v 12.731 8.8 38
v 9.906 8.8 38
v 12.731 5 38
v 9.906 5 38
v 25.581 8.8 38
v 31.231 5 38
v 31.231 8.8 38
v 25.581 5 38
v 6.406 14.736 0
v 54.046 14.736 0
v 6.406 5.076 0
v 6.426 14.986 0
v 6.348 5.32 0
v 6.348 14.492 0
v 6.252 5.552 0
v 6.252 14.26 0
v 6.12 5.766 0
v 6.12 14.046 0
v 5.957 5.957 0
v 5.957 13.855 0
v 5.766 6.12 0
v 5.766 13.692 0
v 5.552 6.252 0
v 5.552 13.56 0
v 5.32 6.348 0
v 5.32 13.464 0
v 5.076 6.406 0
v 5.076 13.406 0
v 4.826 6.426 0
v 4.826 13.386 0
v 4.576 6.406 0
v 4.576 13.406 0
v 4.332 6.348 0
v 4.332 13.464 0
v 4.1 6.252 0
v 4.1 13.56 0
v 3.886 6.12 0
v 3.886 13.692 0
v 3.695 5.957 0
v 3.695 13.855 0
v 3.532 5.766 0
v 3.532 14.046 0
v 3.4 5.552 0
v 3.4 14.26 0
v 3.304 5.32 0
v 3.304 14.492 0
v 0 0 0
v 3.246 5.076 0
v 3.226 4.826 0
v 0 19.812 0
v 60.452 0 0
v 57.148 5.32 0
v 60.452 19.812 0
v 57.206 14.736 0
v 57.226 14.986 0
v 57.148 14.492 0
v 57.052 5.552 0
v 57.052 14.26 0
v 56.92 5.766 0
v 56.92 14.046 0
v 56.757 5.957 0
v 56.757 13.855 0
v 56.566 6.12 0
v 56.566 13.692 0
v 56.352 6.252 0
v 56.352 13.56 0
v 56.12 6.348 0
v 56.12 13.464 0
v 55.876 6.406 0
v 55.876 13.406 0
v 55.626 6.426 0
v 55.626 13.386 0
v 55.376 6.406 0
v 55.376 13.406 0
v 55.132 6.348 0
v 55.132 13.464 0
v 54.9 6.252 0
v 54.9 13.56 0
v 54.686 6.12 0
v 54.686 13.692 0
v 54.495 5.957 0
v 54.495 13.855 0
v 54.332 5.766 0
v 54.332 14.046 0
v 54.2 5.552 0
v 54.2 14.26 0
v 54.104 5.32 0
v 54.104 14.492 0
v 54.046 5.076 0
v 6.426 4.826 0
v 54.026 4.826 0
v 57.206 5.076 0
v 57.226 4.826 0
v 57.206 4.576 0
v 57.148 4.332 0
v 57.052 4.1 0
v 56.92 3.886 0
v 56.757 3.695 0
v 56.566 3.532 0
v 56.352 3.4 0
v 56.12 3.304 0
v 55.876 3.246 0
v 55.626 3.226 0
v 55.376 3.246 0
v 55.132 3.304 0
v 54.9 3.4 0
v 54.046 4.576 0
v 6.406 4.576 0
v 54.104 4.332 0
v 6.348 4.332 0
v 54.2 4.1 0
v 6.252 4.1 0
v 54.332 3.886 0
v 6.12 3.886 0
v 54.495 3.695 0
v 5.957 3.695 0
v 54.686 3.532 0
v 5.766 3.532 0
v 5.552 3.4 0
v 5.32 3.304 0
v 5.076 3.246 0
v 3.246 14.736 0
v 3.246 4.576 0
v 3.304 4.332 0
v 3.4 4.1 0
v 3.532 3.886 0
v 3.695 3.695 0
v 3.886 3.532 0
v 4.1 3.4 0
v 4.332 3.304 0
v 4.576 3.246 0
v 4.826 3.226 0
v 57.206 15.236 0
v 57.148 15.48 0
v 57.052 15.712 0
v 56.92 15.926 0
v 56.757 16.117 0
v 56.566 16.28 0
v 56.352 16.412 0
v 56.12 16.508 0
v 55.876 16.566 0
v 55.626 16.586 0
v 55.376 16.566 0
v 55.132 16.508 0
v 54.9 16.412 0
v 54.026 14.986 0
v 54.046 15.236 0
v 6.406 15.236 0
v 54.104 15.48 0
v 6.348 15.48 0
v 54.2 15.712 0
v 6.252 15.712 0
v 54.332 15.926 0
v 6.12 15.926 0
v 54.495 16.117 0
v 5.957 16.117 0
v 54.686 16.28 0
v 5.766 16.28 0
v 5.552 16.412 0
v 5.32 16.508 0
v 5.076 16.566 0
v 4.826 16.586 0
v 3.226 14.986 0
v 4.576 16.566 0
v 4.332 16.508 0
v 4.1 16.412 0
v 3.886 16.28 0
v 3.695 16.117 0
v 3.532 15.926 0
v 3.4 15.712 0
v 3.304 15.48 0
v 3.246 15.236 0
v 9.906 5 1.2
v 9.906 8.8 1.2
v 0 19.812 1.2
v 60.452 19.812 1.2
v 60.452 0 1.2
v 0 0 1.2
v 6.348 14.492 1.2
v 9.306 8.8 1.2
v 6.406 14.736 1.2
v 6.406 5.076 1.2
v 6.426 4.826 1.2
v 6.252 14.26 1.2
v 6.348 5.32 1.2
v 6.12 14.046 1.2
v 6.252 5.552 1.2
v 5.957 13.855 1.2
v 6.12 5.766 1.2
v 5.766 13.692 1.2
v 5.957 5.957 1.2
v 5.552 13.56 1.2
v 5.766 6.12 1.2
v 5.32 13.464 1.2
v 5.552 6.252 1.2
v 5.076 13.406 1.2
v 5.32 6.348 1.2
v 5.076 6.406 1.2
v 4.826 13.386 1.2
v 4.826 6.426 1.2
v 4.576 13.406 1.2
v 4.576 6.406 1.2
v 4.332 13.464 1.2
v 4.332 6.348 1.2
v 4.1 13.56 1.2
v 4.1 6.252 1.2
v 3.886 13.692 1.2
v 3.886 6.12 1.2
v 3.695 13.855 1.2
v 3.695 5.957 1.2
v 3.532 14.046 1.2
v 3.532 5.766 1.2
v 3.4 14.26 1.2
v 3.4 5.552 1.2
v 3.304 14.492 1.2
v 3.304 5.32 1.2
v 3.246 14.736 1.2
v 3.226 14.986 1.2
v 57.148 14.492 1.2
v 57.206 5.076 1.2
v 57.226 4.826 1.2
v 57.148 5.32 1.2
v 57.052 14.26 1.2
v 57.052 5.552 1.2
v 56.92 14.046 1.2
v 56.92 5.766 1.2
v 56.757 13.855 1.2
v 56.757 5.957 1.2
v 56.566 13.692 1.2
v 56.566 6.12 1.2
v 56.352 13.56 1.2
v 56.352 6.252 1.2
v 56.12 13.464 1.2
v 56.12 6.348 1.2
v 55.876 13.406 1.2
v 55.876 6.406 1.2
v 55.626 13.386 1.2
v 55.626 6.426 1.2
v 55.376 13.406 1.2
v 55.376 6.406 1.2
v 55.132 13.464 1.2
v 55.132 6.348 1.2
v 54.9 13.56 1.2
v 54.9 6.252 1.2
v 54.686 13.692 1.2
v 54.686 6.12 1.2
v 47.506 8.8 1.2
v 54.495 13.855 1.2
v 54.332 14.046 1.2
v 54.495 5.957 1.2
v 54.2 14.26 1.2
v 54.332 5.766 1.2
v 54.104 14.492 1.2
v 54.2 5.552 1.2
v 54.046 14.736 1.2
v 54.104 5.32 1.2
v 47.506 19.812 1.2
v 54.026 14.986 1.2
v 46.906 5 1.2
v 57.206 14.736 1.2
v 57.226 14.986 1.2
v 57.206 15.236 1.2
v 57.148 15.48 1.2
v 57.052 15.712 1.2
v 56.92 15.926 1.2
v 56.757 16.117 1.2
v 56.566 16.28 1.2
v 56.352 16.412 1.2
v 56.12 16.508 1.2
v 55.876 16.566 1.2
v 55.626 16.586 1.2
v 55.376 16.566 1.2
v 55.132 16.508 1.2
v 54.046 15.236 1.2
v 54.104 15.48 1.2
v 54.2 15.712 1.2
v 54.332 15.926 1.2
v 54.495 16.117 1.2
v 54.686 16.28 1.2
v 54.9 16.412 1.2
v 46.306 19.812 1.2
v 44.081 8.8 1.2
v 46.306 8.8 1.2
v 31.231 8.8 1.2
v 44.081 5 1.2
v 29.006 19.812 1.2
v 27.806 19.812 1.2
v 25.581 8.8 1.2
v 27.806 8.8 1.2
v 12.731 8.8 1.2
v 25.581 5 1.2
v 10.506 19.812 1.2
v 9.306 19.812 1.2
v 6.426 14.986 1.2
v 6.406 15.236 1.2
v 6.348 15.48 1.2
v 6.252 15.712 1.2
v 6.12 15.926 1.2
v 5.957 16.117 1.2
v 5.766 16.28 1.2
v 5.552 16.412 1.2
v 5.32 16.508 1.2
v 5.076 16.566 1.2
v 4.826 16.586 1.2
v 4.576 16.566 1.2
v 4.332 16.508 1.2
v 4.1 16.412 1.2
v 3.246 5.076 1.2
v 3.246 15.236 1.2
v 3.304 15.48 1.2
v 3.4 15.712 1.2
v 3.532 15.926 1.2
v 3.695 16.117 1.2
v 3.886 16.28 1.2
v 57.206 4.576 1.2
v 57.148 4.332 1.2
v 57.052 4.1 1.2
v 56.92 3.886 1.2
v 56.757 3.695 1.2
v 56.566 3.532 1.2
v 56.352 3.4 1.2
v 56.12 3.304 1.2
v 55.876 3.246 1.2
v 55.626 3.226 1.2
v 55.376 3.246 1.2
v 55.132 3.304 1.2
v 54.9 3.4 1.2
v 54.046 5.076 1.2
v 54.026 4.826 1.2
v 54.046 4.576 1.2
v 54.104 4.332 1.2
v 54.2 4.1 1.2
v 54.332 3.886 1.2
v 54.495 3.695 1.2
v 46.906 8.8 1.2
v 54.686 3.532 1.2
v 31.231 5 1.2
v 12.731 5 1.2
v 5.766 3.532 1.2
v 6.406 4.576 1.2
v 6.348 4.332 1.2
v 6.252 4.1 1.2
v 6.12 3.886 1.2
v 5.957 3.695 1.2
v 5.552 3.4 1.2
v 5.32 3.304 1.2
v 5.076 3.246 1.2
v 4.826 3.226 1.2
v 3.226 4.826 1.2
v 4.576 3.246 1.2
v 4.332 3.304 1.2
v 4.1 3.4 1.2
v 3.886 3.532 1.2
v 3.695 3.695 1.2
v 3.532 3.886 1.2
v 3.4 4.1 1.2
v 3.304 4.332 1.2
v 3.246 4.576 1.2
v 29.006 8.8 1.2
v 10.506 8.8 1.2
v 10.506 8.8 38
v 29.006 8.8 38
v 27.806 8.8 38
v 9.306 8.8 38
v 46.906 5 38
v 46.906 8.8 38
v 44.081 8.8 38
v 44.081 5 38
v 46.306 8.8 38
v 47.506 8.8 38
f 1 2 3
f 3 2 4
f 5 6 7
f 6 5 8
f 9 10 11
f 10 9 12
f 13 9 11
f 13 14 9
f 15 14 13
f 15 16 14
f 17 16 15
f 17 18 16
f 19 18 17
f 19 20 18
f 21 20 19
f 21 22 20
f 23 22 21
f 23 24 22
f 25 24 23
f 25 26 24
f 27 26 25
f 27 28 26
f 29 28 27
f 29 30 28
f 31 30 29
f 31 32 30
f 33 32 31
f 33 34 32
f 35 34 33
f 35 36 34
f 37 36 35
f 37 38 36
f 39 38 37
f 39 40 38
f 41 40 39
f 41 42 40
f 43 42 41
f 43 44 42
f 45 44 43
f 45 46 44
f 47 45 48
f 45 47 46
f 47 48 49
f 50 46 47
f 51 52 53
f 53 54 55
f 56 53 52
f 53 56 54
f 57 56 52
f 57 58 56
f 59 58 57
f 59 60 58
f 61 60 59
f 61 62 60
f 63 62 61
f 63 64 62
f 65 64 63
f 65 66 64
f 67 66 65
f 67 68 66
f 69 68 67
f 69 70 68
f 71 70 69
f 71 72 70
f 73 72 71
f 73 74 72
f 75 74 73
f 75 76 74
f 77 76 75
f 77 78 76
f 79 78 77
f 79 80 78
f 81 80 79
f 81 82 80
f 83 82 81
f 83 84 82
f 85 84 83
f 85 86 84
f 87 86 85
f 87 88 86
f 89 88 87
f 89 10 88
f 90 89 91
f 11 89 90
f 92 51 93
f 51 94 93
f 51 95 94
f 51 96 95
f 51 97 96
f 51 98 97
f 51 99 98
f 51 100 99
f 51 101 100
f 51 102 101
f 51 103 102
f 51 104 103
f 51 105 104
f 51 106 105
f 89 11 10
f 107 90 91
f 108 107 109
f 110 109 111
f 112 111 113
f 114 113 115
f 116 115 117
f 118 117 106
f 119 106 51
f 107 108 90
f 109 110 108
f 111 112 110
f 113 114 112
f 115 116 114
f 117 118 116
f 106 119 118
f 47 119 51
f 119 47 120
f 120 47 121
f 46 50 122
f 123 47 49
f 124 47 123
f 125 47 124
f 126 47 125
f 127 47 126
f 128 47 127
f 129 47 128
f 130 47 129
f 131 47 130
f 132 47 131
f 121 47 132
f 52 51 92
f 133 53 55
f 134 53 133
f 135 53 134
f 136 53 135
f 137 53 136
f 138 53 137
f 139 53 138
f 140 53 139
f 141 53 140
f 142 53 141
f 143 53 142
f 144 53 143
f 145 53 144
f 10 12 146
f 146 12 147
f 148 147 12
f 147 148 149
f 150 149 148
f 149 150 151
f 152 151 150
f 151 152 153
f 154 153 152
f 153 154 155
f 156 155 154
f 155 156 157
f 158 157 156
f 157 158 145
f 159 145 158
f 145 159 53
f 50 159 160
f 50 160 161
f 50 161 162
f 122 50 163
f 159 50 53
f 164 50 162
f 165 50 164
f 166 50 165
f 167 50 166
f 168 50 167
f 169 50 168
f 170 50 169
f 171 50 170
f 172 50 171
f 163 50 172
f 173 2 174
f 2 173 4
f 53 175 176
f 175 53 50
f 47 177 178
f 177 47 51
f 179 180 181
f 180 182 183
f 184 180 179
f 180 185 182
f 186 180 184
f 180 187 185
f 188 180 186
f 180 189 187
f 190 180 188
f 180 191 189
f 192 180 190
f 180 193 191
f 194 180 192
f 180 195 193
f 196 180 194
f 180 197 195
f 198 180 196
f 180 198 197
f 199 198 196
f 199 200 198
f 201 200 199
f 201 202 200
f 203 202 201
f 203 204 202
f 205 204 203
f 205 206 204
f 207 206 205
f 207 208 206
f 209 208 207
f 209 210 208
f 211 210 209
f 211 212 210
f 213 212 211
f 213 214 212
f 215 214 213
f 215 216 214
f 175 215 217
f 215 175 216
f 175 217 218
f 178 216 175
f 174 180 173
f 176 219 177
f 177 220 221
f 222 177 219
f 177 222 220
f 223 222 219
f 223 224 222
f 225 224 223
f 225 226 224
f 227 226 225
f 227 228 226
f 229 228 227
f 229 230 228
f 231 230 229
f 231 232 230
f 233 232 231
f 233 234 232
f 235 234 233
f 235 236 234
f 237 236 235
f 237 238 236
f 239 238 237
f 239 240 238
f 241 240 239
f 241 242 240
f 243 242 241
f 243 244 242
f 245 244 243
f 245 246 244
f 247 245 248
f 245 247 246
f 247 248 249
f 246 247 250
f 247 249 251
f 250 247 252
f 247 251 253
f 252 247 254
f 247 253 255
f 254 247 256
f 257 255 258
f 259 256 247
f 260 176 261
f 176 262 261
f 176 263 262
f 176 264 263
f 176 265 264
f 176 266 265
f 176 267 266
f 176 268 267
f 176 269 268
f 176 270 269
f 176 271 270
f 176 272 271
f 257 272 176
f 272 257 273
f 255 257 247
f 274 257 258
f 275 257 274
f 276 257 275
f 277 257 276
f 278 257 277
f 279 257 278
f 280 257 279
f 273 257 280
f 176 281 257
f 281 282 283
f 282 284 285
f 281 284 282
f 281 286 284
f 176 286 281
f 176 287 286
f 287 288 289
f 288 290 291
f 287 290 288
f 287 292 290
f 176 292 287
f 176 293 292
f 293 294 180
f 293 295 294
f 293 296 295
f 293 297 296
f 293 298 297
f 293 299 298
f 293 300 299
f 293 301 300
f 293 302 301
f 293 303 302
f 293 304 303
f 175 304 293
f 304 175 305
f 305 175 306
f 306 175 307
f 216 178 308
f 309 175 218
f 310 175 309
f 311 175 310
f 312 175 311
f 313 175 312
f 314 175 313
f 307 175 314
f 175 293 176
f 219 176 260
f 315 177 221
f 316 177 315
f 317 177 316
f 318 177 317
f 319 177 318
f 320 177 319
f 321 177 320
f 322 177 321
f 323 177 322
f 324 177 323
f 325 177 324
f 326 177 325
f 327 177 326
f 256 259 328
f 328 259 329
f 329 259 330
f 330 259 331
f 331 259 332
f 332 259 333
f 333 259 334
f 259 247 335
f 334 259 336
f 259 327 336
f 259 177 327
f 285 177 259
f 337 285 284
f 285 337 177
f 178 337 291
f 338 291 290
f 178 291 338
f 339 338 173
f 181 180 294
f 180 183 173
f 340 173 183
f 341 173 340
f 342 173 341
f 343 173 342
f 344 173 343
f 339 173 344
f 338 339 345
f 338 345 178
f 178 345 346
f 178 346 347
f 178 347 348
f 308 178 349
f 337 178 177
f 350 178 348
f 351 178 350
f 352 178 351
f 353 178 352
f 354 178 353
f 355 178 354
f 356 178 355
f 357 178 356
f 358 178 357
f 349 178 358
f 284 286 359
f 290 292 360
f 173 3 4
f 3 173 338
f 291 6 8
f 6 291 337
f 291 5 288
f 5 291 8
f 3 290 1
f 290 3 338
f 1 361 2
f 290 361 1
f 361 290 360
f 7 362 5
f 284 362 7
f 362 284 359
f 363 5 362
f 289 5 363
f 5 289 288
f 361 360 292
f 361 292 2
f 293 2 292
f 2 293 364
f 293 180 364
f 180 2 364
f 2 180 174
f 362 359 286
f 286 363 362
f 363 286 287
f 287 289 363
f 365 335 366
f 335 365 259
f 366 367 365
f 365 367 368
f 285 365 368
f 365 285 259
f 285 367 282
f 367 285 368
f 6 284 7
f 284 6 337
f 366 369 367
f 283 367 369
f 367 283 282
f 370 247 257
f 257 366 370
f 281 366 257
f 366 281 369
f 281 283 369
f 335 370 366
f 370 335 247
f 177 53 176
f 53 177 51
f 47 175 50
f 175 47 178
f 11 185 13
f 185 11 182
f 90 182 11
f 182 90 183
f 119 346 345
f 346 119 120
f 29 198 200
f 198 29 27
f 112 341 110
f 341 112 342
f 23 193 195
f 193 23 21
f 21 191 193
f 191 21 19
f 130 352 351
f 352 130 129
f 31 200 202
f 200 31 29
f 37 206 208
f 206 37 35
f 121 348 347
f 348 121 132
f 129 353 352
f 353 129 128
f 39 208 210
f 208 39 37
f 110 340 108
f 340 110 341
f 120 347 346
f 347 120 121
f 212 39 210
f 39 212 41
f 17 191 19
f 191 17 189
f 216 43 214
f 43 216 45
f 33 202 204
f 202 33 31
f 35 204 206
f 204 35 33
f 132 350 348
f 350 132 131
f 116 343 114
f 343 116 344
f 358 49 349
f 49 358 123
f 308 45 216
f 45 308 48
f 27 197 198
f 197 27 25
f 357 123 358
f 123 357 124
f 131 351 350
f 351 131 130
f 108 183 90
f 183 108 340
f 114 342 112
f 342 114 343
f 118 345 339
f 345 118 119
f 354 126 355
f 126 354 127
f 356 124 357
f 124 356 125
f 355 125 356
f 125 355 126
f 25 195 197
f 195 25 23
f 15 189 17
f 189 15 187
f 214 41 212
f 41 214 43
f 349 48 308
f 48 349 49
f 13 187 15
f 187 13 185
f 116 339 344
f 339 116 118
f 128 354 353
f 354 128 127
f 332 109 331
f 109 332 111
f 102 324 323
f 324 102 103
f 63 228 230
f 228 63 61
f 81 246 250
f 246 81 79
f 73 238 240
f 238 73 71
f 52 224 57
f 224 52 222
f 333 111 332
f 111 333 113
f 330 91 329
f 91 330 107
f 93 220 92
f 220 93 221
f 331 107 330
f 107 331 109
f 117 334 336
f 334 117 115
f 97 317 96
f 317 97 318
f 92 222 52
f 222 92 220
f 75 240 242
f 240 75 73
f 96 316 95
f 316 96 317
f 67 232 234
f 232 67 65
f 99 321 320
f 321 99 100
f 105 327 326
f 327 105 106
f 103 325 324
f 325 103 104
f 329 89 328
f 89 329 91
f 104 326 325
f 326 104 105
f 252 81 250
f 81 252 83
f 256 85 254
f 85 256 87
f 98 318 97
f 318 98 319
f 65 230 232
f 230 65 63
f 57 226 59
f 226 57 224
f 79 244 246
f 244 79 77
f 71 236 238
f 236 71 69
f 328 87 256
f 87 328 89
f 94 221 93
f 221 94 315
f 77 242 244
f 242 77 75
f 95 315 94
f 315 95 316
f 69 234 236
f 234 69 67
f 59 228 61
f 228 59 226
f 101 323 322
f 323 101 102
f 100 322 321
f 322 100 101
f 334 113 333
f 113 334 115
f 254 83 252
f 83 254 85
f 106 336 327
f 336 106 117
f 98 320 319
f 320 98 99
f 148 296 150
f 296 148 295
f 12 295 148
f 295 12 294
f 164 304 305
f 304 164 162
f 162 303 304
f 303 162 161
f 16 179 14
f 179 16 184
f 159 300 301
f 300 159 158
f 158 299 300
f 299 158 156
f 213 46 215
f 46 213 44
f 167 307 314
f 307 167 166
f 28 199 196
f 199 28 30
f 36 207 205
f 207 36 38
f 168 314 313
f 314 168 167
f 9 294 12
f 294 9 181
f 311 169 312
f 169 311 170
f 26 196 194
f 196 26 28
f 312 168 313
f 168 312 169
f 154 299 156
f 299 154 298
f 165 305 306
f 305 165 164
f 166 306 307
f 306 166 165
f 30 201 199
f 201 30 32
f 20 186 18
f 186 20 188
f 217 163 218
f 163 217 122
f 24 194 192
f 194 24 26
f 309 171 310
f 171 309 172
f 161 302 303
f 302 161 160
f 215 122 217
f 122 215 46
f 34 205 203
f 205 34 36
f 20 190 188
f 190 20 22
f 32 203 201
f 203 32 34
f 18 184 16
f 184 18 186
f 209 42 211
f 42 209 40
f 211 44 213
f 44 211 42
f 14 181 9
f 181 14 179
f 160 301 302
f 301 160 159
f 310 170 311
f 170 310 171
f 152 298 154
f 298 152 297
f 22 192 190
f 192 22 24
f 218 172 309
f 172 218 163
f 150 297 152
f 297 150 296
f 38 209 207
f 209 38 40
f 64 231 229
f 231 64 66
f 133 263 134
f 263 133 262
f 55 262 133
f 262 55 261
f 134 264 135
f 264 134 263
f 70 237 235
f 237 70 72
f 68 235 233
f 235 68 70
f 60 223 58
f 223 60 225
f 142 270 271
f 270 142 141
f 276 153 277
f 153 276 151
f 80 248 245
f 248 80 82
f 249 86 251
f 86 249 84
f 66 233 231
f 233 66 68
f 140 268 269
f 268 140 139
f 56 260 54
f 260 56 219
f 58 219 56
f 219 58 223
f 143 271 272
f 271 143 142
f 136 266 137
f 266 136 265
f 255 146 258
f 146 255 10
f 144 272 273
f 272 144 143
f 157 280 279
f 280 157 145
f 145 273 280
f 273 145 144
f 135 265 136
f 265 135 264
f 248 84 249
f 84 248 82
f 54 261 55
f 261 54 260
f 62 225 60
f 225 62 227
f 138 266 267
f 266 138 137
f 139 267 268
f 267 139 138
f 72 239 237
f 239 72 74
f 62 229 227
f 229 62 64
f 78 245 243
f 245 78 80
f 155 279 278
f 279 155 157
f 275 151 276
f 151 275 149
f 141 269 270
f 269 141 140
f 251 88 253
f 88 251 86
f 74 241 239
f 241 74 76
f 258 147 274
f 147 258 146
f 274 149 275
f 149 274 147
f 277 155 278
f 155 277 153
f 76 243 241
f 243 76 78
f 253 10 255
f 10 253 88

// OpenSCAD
$fn=40; // model faces resolution.

RJ12_otvor_velikost_x=12.85;
RJ12_otvor_velikost_y=2*18.4;
RJ12_otvor_sila_materialu=3.8;
RJ12_vzdalenost_od_okraje=5;
RJ12_sire_konektoru=15;
RJ12_rozestup_mezi_konektory=3.5;
sila_materialu=1.2;
roztec_der=10.16;
pocet_der_v_ose_y=2;
pocet_der_v_ose_x=6;
snizeni_rozmeru_desky=0.254;
RJ_pocet_konektoru=2;

prumer_sroubu=3.2;

//konektor();
drzak();

module drzak(){

for(a = [0 : 1 : RJ_pocet_konektoru-1])
  {  
      translate([a*(RJ12_sire_konektoru+RJ12_rozestup_mezi_konektory)+roztec_der-snizeni_rozmeru_desky,0,0]) 
     konektor(); 
      
      
}

deska();
 }
 
 
module konektor(){
//bocní vyztuhy
    
   translate([sila_materialu/2,0,0])
    rotate ([0,-90,0])
            linear_extrude (height = sila_materialu, convexity = 10)
                polygon(points=[[sila_materialu,RJ12_vzdalenost_od_okraje+RJ12_otvor_sila_materialu],[RJ12_otvor_velikost_y+sila_materialu, RJ12_vzdalenost_od_okraje+RJ12_otvor_sila_materialu],[sila_materialu,roztec_der*pocet_der_v_ose_y-2*snizeni_rozmeru_desky],[sila_materialu,roztec_der*pocet_der_v_ose_y-2*snizeni_rozmeru_desky]]); 
   
     translate([RJ12_sire_konektoru+RJ12_rozestup_mezi_konektory+sila_materialu/2,0,0])
    rotate ([0,-90,0])
            linear_extrude (height = sila_materialu, convexity = 10)
                polygon(points=[[sila_materialu,RJ12_vzdalenost_od_okraje+RJ12_otvor_sila_materialu],[RJ12_otvor_velikost_y+sila_materialu, RJ12_vzdalenost_od_okraje+RJ12_otvor_sila_materialu],[sila_materialu,roztec_der*pocet_der_v_ose_y-2*snizeni_rozmeru_desky],[sila_materialu,roztec_der*pocet_der_v_ose_y-2*snizeni_rozmeru_desky]]);  


translate([0,0,0])
difference () {
	cube([RJ12_sire_konektoru+RJ12_rozestup_mezi_konektory,roztec_der*pocet_der_v_ose_y-2*snizeni_rozmeru_desky,sila_materialu+RJ12_otvor_velikost_y]);   

//tvorba odstupu konektoru od okraje desky
translate([-0.005,-0.005,sila_materialu])
cube([RJ12_sire_konektoru+RJ12_rozestup_mezi_konektory+0.01,RJ12_vzdalenost_od_okraje+0.005,RJ12_otvor_velikost_y+0.01]);     
  
  
    
    translate([(RJ12_sire_konektoru+RJ12_rozestup_mezi_konektory-RJ12_otvor_velikost_x)/2,0,sila_materialu])
    //otvor na konektor
    cube([RJ12_otvor_velikost_x,roztec_der*pocet_der_v_ose_y-2*snizeni_rozmeru_desky+0.01,sila_materialu+RJ12_otvor_velikost_y+0.01]);
 
    
    //odstarněni materialu za drzakem
        translate([-0.005,RJ12_otvor_sila_materialu+RJ12_vzdalenost_od_okraje,sila_materialu])
  
  cube([RJ12_sire_konektoru+RJ12_rozestup_mezi_konektory+0.01,roztec_der*pocet_der_v_ose_y-2*snizeni_rozmeru_desky,sila_materialu+RJ12_otvor_velikost_y]);    
   }
    
    }
    
      module deska(){
        difference () {
        //základní materiál
        cube([roztec_der*pocet_der_v_ose_x-2*snizeni_rozmeru_desky,roztec_der*pocet_der_v_ose_y-2*snizeni_rozmeru_desky,sila_materialu]);   
        
            
            //otvory na šrouby
          translate([roztec_der/2-snizeni_rozmeru_desky,roztec_der/2-snizeni_rozmeru_desky,-0.005])
          cylinder(h=sila_materialu+0.01, r=prumer_sroubu/2, center=false);
            
            translate([(pocet_der_v_ose_x-1)*roztec_der+roztec_der/2-snizeni_rozmeru_desky,roztec_der/2-snizeni_rozmeru_desky,-0.005])
          cylinder(h=sila_materialu+0.01, r=prumer_sroubu/2, center=false);
            
            translate([roztec_der/2-snizeni_rozmeru_desky,(pocet_der_v_ose_y-1)*roztec_der+roztec_der/2-snizeni_rozmeru_desky,-0.005])
          cylinder(h=sila_materialu+0.01, r=prumer_sroubu/2, center=false);
            
            translate([(pocet_der_v_ose_x-1)*roztec_der+roztec_der/2-snizeni_rozmeru_desky,(pocet_der_v_ose_y-1)*roztec_der+roztec_der/2-snizeni_rozmeru_desky,-0.005])
          cylinder(h=sila_materialu+0.01, r=prumer_sroubu/2, center=false);
            
        }
     
      
          }
